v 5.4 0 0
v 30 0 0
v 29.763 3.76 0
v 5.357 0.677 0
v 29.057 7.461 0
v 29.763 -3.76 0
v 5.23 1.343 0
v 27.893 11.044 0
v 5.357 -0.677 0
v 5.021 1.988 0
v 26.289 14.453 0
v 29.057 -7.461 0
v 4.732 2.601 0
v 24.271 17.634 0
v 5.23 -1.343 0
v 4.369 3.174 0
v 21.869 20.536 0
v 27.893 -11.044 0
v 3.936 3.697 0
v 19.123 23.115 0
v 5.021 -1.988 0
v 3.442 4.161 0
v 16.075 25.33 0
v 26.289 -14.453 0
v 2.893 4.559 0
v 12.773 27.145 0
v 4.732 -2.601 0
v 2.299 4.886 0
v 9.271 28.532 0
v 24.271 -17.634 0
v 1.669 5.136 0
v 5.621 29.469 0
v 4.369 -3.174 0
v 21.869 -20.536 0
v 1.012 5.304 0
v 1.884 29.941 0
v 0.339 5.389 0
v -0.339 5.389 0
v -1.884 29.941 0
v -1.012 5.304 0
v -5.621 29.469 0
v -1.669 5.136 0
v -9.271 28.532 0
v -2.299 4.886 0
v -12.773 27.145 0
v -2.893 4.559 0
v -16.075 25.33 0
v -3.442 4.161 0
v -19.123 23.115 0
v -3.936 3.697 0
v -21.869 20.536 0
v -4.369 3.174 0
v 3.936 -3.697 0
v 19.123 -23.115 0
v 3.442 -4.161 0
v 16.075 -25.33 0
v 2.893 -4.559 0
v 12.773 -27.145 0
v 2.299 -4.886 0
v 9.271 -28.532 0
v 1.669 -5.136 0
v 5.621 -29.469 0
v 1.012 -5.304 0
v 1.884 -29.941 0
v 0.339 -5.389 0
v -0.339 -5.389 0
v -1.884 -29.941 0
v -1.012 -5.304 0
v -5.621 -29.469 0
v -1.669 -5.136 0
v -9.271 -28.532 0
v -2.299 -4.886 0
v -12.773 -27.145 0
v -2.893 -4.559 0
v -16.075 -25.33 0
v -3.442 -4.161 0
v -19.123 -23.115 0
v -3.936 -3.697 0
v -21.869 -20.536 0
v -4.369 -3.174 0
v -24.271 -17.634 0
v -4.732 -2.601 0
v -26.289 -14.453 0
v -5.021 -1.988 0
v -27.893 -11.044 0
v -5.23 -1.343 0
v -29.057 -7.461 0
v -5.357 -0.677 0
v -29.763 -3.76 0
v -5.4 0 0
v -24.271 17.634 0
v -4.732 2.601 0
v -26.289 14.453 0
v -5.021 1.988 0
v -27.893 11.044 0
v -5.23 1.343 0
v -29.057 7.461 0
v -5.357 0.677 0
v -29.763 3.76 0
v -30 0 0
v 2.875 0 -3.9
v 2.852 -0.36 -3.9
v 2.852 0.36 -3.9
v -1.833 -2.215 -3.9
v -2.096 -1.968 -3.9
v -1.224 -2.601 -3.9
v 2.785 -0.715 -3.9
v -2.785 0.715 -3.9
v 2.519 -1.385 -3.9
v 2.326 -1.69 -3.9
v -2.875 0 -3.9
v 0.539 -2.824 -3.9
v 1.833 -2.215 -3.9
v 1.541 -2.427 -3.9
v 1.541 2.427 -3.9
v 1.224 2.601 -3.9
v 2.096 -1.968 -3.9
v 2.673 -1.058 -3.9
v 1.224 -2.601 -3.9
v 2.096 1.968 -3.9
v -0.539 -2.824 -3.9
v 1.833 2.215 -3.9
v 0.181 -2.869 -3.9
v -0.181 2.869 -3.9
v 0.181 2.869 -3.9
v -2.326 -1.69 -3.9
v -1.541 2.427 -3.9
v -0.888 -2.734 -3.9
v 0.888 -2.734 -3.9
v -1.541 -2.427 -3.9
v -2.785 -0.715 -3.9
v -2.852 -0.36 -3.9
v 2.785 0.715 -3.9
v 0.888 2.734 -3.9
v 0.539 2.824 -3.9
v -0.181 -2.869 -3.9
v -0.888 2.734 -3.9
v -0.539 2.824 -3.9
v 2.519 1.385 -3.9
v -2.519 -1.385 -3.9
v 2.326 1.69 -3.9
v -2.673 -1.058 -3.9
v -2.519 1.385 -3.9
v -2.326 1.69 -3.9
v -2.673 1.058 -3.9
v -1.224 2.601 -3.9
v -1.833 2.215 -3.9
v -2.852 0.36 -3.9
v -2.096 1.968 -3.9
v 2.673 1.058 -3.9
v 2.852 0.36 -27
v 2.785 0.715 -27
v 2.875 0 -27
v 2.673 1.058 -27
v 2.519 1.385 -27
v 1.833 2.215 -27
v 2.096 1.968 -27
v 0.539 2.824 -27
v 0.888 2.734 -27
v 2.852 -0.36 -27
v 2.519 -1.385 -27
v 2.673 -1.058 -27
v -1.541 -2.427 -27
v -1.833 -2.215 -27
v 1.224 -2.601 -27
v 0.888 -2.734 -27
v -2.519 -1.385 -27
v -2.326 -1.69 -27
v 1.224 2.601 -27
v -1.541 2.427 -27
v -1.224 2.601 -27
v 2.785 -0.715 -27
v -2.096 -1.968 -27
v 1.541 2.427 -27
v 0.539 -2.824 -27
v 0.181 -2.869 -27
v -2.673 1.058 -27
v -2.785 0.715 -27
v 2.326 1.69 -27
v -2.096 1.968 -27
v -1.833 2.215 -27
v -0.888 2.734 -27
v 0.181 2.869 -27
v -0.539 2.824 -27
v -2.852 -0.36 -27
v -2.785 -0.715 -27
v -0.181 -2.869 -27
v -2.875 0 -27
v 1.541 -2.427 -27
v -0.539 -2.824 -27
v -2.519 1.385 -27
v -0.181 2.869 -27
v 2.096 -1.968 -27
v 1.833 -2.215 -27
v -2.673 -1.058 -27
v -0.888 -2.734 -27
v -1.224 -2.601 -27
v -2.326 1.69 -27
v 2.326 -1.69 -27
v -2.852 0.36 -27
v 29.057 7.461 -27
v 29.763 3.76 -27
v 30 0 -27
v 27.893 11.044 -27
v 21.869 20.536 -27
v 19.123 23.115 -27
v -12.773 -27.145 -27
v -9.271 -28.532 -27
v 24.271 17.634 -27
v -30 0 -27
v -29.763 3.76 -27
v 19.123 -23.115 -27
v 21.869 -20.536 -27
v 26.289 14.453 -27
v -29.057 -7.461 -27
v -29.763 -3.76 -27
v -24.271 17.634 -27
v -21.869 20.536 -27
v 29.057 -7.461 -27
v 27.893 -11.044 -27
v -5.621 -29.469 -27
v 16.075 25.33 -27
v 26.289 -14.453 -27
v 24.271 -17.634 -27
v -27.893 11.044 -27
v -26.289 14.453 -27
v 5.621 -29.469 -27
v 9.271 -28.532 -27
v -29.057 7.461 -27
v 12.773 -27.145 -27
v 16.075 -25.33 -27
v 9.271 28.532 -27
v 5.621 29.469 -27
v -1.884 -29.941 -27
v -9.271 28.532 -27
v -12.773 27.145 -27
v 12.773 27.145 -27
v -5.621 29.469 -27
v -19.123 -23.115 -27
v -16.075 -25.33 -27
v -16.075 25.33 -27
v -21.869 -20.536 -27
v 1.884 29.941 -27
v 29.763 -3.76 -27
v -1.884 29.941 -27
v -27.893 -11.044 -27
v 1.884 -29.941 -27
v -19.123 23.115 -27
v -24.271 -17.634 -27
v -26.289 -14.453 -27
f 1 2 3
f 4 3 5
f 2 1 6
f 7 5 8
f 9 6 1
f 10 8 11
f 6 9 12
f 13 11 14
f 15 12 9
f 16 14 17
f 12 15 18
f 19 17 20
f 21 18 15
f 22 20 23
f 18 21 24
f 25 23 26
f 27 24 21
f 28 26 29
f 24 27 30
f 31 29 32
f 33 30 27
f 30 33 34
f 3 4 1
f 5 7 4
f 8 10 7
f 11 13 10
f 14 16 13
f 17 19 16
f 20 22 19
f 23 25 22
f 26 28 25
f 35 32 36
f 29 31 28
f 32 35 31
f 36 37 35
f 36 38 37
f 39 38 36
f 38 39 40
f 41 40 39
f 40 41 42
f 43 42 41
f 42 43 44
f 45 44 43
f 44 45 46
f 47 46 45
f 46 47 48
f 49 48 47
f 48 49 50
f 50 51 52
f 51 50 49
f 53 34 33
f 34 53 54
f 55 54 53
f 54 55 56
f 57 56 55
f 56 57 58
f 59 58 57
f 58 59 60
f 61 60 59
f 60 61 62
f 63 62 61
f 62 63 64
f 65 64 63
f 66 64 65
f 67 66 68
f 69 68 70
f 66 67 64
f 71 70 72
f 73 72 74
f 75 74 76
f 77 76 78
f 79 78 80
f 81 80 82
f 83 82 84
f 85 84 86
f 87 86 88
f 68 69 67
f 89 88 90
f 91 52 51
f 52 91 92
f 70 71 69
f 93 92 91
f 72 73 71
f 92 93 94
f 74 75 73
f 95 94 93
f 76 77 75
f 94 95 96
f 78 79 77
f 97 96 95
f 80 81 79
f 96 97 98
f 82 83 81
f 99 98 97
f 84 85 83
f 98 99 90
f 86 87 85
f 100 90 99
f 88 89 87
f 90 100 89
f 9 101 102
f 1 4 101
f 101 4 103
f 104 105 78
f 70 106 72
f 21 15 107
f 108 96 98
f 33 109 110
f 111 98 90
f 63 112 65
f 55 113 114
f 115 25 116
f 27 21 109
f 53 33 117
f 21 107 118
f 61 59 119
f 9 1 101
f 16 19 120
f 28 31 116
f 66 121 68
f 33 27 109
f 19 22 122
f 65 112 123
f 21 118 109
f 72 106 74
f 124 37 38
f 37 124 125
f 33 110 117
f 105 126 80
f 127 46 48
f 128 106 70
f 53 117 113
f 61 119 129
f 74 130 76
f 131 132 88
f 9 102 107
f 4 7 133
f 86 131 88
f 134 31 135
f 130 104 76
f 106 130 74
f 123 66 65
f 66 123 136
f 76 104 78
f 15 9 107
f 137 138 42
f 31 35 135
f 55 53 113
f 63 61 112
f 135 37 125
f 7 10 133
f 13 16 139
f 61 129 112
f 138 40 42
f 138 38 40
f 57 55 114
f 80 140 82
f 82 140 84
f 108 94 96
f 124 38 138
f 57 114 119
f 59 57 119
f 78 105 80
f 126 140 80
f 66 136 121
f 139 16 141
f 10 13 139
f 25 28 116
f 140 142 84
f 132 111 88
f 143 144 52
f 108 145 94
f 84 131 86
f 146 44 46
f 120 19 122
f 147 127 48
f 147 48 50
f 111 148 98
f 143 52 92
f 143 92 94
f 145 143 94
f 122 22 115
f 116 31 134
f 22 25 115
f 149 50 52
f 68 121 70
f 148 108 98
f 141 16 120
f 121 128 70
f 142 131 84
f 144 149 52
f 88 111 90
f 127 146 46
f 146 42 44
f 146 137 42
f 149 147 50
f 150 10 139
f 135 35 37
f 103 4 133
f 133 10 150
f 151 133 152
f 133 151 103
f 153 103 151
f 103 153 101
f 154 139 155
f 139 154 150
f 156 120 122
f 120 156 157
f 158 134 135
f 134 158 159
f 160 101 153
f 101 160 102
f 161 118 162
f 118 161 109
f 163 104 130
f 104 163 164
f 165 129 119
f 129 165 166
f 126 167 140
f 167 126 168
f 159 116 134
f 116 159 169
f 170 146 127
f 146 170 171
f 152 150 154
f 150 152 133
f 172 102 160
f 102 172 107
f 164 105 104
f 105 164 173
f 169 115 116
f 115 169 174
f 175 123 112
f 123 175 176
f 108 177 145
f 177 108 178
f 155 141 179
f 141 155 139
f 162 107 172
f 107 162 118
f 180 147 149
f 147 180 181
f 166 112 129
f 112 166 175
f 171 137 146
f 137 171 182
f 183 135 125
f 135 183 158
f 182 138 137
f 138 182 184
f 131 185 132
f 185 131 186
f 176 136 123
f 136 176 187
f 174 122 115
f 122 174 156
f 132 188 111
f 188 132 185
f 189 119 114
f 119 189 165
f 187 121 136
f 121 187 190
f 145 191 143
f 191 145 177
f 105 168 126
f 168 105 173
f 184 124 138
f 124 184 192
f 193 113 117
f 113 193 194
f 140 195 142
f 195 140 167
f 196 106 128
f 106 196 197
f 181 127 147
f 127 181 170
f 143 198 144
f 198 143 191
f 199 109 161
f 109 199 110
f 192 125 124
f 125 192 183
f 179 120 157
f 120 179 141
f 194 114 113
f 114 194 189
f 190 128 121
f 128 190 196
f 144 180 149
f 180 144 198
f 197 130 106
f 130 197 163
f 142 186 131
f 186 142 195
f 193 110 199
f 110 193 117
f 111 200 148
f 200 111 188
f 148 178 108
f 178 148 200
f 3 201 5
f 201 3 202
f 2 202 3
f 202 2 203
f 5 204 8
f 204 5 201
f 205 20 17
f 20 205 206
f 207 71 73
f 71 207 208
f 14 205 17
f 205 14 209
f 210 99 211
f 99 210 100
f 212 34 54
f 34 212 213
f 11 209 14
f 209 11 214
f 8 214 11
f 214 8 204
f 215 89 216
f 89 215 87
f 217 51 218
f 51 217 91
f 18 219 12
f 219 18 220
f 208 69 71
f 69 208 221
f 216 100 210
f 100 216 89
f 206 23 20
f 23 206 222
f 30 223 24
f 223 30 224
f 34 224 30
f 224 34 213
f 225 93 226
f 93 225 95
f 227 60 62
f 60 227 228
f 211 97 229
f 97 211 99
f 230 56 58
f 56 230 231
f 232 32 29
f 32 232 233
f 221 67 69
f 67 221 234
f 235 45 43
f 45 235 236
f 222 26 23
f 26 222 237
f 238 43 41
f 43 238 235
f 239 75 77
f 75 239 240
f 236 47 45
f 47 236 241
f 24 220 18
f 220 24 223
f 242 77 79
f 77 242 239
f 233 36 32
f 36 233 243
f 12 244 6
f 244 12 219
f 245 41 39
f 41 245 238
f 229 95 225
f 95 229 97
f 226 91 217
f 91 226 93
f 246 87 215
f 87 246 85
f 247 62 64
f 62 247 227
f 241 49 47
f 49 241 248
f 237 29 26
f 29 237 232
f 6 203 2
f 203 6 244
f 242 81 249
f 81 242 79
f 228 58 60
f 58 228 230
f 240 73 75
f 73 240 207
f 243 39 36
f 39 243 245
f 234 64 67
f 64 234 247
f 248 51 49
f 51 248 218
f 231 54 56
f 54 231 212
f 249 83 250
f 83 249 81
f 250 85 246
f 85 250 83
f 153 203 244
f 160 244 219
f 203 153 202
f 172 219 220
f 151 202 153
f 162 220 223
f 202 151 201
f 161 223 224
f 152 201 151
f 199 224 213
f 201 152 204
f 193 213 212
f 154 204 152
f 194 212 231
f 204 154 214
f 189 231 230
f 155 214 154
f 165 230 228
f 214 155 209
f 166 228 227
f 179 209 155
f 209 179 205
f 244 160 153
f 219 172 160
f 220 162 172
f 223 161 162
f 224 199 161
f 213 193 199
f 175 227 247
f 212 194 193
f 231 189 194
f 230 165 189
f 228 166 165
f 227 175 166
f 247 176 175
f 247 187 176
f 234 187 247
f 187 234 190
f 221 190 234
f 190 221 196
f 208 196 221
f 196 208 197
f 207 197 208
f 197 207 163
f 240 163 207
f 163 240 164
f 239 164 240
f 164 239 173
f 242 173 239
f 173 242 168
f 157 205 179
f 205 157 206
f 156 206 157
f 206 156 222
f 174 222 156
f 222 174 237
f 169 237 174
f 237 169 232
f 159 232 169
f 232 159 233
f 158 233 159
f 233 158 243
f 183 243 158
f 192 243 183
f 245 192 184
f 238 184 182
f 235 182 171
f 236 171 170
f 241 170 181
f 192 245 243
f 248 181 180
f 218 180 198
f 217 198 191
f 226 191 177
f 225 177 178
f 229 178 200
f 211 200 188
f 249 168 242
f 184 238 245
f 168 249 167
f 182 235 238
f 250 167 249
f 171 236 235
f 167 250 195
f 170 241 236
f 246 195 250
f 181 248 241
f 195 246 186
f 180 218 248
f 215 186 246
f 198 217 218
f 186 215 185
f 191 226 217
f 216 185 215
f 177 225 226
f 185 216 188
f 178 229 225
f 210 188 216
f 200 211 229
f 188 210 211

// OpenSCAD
$fn = 50;

difference() {
	union() {
		translate(v = [0, 0, -27.0]) {
			cylinder(h = 27, r = 30.0);
		}
	}
	union() {
		translate(v = [0, 0, 0]) {
			rotate(a = [0, 0, 0]) {
				difference() {
					union() {
						translate(v = [0, 0, -30.0]) {
							cylinder(h = 30, r = 2.6);
						}
						translate(v = [0, 0, -3.9]) {
							cylinder(h = 3.9, r1 = 2.875, r2 = 5.4);
						}
						translate(v = [0, 0, -30.0]) {
							cylinder(h = 30, r = 2.875);
						}
						translate(v = [0, 0, -30.0]) {
							cylinder(h = 30, r = 2.6);
						}
					}
					union();
				}
			}
		}
	}
}
